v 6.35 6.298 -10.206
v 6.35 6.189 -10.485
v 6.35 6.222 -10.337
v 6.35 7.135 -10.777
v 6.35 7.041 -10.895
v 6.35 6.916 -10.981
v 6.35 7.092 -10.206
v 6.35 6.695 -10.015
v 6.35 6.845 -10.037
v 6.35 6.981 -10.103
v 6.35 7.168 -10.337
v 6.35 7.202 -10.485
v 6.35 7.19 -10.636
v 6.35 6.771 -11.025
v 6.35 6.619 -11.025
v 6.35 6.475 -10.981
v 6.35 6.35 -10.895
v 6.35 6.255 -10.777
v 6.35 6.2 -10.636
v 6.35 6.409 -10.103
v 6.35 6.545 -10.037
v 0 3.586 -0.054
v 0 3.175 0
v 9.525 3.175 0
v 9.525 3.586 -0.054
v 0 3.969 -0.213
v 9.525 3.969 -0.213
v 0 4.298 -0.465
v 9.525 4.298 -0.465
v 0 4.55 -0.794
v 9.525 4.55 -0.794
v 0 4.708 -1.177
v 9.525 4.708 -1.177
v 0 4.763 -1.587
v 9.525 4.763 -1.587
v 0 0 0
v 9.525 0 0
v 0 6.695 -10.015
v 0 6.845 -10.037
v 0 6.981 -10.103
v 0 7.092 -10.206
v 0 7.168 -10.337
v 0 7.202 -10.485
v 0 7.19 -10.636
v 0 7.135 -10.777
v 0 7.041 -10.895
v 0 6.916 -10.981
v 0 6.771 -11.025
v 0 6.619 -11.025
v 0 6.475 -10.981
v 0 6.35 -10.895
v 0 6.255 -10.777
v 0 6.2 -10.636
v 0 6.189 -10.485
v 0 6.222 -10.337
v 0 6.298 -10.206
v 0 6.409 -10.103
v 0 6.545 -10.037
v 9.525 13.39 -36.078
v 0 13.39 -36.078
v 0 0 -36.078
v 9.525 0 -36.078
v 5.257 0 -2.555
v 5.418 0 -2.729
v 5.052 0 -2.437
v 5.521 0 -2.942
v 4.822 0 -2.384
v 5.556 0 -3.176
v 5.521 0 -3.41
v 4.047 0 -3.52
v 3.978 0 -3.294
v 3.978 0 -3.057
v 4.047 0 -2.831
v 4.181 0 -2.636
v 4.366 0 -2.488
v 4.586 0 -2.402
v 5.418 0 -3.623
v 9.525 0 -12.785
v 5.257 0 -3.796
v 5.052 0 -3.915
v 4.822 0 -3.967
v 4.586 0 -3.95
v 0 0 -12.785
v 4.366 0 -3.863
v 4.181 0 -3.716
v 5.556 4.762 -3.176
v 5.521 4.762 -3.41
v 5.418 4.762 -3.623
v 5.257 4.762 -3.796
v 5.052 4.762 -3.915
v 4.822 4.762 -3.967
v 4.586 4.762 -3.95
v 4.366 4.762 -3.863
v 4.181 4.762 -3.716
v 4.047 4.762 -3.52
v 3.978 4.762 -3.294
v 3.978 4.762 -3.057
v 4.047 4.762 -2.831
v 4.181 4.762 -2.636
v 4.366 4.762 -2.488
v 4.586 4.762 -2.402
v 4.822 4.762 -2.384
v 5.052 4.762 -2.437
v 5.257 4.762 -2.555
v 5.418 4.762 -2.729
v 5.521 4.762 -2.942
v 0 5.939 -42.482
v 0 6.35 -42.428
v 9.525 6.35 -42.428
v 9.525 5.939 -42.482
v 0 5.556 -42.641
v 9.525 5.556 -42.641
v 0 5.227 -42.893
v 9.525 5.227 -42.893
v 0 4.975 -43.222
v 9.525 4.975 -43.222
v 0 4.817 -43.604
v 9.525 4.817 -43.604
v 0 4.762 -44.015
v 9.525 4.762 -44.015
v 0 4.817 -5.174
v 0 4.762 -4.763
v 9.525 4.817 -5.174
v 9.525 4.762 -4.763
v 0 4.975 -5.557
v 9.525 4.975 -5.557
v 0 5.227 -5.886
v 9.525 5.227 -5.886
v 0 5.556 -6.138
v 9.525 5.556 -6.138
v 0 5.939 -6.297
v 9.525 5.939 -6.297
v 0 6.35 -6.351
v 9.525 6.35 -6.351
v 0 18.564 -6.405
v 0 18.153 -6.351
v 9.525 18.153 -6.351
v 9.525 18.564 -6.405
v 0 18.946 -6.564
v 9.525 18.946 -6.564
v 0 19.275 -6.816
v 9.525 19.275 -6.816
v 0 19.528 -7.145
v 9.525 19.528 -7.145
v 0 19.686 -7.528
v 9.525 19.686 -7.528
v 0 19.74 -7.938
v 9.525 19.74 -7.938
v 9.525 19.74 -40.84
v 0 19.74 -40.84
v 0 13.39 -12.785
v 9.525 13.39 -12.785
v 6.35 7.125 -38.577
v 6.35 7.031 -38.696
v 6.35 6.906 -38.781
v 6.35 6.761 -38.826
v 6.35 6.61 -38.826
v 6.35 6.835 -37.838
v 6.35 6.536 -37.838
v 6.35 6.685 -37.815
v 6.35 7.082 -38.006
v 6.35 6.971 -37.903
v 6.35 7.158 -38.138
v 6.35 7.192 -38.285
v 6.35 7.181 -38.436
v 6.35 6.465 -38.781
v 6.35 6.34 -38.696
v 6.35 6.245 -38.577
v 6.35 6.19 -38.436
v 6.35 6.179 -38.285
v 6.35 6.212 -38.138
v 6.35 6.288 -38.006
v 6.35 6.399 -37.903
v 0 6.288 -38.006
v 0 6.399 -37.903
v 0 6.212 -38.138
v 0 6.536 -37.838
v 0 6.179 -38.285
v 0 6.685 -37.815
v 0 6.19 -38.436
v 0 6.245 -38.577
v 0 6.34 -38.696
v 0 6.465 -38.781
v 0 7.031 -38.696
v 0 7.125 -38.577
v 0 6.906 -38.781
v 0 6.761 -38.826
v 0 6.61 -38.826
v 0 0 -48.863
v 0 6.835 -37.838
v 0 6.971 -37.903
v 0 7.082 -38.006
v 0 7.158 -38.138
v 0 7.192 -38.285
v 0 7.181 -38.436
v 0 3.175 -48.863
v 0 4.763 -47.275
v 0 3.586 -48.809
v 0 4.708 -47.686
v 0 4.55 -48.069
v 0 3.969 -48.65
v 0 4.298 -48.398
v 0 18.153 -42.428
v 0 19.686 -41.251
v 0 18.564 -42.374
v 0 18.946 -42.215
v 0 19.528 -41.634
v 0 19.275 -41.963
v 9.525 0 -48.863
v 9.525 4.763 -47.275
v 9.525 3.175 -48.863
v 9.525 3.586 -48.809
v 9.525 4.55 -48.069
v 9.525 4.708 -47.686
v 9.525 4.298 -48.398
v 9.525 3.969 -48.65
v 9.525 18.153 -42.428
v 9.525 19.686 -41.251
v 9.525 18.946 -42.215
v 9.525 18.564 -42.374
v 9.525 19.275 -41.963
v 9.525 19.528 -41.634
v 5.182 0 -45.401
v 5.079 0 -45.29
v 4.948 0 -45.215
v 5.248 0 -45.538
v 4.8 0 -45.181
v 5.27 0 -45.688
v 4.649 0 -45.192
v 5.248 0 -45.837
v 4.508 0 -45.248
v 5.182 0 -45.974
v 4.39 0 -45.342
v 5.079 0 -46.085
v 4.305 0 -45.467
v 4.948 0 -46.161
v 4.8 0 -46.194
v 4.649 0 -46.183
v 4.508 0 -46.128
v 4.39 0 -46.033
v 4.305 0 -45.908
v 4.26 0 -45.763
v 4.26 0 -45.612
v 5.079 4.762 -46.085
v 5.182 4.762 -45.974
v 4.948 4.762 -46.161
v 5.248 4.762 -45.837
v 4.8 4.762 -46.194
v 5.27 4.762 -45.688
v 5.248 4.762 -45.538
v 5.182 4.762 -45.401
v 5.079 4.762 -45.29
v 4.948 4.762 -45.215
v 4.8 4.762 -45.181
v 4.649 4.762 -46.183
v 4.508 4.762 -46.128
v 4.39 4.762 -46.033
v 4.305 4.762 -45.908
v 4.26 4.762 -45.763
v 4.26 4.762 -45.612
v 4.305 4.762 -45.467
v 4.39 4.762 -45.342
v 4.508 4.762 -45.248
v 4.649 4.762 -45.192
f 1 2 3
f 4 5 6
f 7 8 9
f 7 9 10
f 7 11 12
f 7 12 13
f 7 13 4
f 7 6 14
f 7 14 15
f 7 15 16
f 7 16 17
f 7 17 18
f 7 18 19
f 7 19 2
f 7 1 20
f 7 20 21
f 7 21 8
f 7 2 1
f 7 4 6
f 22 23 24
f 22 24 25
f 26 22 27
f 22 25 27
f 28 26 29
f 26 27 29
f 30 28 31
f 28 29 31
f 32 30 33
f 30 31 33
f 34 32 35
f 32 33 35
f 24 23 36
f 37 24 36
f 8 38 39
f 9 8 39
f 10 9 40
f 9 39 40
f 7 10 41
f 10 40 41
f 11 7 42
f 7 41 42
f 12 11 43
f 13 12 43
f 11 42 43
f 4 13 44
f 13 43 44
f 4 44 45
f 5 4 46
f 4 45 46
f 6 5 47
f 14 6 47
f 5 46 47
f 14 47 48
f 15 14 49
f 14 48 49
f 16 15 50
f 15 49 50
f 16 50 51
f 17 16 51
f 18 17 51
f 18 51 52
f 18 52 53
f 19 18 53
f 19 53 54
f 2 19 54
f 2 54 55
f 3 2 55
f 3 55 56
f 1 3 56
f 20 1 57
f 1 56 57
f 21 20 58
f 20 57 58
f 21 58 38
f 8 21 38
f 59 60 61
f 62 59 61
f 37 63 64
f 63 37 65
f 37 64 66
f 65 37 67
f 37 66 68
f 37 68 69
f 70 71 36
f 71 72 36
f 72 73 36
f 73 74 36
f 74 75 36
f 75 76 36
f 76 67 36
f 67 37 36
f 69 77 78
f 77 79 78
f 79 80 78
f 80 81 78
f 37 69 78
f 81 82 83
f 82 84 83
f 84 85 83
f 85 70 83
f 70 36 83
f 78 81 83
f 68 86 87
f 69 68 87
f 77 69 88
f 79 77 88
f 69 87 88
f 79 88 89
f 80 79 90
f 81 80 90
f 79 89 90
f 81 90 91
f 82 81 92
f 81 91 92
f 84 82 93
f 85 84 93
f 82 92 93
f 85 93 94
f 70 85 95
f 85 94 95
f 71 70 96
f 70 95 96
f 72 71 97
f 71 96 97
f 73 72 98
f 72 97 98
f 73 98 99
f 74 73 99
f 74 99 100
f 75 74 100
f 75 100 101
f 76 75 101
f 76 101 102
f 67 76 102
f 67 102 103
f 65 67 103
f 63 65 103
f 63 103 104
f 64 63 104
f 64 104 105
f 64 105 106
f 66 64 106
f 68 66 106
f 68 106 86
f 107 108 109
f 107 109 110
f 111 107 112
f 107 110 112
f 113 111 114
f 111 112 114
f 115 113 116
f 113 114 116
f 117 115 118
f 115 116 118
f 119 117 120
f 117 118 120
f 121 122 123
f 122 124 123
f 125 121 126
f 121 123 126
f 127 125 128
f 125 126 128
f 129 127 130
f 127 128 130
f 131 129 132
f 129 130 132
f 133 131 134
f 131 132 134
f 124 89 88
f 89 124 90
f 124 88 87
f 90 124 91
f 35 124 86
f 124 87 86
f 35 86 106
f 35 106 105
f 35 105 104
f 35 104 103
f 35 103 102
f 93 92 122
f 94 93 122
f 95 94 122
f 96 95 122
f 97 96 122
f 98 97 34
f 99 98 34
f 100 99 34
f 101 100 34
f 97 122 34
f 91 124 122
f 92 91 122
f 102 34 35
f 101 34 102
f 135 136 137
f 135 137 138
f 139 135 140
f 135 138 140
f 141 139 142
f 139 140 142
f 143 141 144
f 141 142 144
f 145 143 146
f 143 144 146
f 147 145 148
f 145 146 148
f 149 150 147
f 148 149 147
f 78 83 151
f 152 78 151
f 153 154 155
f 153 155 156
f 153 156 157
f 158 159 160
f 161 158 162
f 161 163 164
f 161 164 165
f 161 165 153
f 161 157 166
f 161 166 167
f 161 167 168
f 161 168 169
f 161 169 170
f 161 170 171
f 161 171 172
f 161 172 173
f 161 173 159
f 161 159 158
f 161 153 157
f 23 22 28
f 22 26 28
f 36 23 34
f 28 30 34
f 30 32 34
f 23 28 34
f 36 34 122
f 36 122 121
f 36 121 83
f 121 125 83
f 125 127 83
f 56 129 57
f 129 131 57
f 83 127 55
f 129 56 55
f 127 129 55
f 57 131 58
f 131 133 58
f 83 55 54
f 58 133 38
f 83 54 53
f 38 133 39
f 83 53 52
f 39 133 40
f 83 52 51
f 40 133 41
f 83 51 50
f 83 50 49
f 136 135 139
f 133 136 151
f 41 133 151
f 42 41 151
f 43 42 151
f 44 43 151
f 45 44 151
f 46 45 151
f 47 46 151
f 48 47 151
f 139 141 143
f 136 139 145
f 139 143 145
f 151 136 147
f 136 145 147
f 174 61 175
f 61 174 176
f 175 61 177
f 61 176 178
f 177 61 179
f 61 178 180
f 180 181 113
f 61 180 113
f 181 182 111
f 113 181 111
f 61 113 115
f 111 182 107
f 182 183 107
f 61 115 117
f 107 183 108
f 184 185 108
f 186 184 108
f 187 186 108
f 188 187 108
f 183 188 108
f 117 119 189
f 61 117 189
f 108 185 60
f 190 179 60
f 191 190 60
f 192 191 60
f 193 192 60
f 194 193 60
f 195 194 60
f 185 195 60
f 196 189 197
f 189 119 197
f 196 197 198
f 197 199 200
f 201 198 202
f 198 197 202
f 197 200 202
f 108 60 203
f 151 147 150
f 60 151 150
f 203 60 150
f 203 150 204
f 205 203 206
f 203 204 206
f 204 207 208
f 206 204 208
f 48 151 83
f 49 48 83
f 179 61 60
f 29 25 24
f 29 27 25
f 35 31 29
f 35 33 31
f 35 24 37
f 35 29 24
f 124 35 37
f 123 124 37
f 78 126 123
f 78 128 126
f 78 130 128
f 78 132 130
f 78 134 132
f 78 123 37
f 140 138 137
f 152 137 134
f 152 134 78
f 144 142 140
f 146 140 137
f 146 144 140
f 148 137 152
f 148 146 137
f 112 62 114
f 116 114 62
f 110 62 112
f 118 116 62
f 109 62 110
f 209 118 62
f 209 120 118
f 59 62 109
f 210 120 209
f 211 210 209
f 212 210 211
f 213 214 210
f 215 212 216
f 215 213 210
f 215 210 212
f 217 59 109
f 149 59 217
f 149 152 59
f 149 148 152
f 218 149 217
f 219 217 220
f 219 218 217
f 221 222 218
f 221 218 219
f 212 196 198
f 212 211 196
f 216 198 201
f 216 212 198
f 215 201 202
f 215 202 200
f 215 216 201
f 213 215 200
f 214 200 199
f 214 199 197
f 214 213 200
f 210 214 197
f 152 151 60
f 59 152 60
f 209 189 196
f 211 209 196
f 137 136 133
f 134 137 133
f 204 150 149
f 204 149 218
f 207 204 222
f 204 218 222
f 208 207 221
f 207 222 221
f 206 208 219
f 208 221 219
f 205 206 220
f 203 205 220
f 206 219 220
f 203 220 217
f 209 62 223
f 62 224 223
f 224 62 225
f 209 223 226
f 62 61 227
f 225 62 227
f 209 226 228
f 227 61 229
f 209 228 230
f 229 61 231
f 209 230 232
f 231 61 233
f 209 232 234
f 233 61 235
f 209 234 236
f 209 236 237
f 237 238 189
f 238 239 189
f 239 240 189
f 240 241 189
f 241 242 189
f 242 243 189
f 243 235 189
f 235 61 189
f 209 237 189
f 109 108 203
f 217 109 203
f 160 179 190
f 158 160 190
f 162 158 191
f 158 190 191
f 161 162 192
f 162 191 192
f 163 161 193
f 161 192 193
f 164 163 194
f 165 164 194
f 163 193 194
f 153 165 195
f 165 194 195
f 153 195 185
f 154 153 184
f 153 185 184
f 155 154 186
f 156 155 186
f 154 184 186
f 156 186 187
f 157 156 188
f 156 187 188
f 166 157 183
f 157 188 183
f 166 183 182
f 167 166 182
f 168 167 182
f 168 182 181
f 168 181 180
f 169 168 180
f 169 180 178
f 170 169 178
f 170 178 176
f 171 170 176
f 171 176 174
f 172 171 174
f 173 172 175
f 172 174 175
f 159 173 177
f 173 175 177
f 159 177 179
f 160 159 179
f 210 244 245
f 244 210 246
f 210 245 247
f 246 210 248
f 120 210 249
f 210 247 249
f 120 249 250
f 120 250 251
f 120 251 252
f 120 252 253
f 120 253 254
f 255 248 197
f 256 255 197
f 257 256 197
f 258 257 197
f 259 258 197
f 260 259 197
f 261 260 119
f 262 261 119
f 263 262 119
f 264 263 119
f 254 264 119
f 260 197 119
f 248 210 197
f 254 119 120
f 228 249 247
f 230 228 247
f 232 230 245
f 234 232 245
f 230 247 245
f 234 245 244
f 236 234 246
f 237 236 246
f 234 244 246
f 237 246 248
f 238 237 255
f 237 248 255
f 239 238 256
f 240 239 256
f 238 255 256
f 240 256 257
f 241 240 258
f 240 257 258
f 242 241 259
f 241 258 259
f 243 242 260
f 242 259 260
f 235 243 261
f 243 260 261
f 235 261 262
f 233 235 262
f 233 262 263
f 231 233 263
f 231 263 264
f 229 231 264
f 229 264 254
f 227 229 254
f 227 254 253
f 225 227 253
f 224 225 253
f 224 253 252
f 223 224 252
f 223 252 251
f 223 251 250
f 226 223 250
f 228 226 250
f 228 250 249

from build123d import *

# Parameters (mm, degrees)
BOSS_EXTRUDE1_DEPTH = 9.525
CUT_EXTRUDE1_REACH  = 6.763
SKETCH2_R           = 0.508
SKETCH2_R_2         = 0.79375
SKETCH3_R           = 0.508
CUT_EXTRUDE2_DEPTH  = 6.35
FILLET1_R           = 1.5875


with BuildPart() as part:
    # Sketch1 → Boss-Extrude1 (new body)
    with BuildSketch(Plane(origin=(0, 0, 0), x_dir=(0, 0, -1), z_dir=(1, 0, 0))):
        Polygon((0, 0), (12.7847852, 0), (12.7847852, 13.390245), (36.0778552, 13.390245), (36.0778552, 0), (48.8626404, 0), (48.8626404, 4.7625), (42.4278552, 4.7625), (42.4278552, 19.740245), (41.4309052, 19.740245), (6.3509652, 19.740245), (6.3509652, 4.7625), (0, 4.7625), align=None)
    extrude(amount=BOSS_EXTRUDE1_DEPTH)

    # Sketch2 → Cut-Extrude1 (cut, up to next)
    with BuildSketch(Plane(origin=(0, 4.7625, 0), x_dir=(1, 0, 0), z_dir=(0, 1, 0)), mode=Mode.PRIVATE) as cut_extrude1_sk1:
        with Locations((4.7625, 45.6876404)):
            Circle(SKETCH2_R)
    cut_extrude1_tool1 = extrude(cut_extrude1_sk1.sketch, amount=-CUT_EXTRUDE1_REACH, mode=Mode.PRIVATE) & part.part
    add(cut_extrude1_tool1.solids().sort_by_distance((4.7625, 4.7625, -45.68764))[0], mode=Mode.SUBTRACT)
    # Sketch2 → Cut-Extrude1 (cut, up to next)
    with BuildSketch(Plane(origin=(0, 4.7625, 0), x_dir=(1, 0, 0), z_dir=(0, 1, 0)), mode=Mode.PRIVATE) as cut_extrude1_sk2:
        with Locations((4.7625, 3.1756604)):
            Circle(SKETCH2_R_2)
    cut_extrude1_tool2 = extrude(cut_extrude1_sk2.sketch, amount=-CUT_EXTRUDE1_REACH, mode=Mode.PRIVATE) & part.part
    add(cut_extrude1_tool2.solids().sort_by_distance((4.7625, 4.7625, -3.17566))[0], mode=Mode.SUBTRACT)

    # Sketch3 → Cut-Extrude2 (cut)
    with BuildSketch(Plane.ZY):
        with Locations((-38.3232152, 6.68528)):
            Circle(SKETCH3_R)
        with Locations((-10.5229152, 6.6951225)):
            Circle(SKETCH3_R)
    extrude(amount=-CUT_EXTRUDE2_DEPTH, mode=Mode.SUBTRACT)

    # Fillet1
    fillet1_edges = [part.edges().sort_by_distance(p)[0] for p in [
        (4.7625, 4.7625, 0),
        (4.7625, 4.7625, -6.3509652),
        (4.7625, 19.740245, -6.3509652),
        (4.7625, 19.740245, -42.4278552),
        (4.7625, 4.7625, -42.4278552),
        (4.7625, 4.7625, -48.8626404),
    ]]
    fillet(fillet1_edges, radius=FILLET1_R)


solid = part.part
